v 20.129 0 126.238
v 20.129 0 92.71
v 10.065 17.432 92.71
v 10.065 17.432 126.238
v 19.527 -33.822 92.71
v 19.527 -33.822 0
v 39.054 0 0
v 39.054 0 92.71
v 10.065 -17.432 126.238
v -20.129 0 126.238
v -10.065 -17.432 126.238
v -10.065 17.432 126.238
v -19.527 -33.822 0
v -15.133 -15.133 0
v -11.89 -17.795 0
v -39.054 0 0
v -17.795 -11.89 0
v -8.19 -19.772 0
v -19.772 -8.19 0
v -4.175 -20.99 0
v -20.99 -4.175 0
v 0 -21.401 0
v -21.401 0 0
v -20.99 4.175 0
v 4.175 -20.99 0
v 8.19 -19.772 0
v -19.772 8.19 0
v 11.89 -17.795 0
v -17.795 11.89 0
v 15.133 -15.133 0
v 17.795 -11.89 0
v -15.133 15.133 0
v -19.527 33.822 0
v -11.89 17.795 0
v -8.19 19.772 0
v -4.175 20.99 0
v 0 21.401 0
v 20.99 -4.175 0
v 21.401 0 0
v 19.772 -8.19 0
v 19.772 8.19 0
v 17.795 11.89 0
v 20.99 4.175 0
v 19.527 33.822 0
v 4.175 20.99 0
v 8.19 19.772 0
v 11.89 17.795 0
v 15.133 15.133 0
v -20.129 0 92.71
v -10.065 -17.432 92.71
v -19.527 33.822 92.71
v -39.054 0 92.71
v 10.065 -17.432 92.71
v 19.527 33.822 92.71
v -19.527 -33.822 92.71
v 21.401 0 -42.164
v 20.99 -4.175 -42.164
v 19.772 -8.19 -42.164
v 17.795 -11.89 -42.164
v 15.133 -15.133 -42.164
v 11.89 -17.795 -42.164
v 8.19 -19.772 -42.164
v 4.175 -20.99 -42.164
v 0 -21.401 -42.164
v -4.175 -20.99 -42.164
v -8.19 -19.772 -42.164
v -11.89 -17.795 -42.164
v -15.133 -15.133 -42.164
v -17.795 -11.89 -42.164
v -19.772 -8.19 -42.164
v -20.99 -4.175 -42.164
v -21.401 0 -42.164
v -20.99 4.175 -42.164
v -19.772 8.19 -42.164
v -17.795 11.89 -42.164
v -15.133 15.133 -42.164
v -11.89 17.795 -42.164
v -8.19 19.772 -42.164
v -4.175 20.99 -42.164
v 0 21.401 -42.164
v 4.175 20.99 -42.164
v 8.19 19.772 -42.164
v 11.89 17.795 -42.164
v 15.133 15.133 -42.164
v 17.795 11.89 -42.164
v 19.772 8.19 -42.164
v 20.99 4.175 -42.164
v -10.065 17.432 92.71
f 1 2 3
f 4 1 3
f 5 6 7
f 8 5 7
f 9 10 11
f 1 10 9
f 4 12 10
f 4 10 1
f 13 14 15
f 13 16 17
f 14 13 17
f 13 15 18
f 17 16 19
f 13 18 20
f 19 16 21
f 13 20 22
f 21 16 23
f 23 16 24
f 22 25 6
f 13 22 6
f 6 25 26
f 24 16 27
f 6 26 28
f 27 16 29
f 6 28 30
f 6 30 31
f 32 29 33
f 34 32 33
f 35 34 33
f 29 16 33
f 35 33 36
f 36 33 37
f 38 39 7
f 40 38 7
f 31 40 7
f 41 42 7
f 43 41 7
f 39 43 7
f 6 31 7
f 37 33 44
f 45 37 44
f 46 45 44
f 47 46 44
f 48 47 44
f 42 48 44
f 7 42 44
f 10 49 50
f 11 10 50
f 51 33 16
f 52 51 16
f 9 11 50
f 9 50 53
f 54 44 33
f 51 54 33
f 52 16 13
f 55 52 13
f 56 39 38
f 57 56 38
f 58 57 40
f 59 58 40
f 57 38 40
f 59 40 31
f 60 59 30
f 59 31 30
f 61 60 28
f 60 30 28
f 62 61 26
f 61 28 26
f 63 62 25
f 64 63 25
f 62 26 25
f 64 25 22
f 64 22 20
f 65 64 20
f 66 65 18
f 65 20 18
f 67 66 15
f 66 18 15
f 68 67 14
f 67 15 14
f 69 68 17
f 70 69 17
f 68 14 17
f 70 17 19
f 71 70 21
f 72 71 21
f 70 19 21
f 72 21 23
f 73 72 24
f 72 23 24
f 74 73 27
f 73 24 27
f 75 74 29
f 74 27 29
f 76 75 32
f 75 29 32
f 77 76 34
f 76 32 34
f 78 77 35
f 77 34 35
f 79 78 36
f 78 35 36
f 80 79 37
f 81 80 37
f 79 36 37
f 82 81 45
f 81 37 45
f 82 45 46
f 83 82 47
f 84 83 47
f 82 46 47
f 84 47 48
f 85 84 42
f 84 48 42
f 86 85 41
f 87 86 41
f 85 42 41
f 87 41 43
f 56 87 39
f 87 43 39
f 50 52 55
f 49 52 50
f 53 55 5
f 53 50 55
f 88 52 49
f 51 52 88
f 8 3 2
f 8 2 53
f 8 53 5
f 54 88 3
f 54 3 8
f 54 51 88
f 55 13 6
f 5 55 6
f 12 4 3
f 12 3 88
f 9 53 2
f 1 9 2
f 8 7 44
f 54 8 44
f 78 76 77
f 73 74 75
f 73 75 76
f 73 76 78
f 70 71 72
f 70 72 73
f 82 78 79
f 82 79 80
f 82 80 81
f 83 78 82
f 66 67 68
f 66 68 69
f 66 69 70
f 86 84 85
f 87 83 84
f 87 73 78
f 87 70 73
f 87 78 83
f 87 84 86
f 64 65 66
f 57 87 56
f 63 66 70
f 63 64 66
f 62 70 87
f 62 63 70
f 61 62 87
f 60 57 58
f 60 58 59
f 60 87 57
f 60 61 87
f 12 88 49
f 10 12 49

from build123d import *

# Parameters (mm, degrees)
F1_DEPTH = 92.71
F3_DEPTH = 33.528
F4_R     = 21.401404
F5_DEPTH = 42.164


with BuildPart() as f1:
    # F0 (on Top) → F1 (new body)
    with BuildSketch(Plane.XY):
        Polygon((19.526986, 33.821732), (-19.526986, 33.821732), (-39.053972, 0), (-19.526986, -33.821732), (19.526986, -33.821732), (39.053972, 0), align=None)
    extrude(amount=F1_DEPTH)

    # F2 (on face) → F3 (join)
    with BuildSketch(Plane.XY.offset(92.71)):
        Polygon((10.06457, 17.432347), (-10.06457, 17.432347), (-20.12914, 0), (-10.06457, -17.432347), (10.06457, -17.432347), (20.12914, 0), align=None)
    extrude(amount=F3_DEPTH)

    # F4 (on face) → F5 (join)
    with BuildSketch(Plane(origin=(0, 0, 0), x_dir=(1, 0, 0), z_dir=(0, 0, -1))):
        Circle(F4_R)
    extrude(amount=F5_DEPTH)


solid = f1.part
